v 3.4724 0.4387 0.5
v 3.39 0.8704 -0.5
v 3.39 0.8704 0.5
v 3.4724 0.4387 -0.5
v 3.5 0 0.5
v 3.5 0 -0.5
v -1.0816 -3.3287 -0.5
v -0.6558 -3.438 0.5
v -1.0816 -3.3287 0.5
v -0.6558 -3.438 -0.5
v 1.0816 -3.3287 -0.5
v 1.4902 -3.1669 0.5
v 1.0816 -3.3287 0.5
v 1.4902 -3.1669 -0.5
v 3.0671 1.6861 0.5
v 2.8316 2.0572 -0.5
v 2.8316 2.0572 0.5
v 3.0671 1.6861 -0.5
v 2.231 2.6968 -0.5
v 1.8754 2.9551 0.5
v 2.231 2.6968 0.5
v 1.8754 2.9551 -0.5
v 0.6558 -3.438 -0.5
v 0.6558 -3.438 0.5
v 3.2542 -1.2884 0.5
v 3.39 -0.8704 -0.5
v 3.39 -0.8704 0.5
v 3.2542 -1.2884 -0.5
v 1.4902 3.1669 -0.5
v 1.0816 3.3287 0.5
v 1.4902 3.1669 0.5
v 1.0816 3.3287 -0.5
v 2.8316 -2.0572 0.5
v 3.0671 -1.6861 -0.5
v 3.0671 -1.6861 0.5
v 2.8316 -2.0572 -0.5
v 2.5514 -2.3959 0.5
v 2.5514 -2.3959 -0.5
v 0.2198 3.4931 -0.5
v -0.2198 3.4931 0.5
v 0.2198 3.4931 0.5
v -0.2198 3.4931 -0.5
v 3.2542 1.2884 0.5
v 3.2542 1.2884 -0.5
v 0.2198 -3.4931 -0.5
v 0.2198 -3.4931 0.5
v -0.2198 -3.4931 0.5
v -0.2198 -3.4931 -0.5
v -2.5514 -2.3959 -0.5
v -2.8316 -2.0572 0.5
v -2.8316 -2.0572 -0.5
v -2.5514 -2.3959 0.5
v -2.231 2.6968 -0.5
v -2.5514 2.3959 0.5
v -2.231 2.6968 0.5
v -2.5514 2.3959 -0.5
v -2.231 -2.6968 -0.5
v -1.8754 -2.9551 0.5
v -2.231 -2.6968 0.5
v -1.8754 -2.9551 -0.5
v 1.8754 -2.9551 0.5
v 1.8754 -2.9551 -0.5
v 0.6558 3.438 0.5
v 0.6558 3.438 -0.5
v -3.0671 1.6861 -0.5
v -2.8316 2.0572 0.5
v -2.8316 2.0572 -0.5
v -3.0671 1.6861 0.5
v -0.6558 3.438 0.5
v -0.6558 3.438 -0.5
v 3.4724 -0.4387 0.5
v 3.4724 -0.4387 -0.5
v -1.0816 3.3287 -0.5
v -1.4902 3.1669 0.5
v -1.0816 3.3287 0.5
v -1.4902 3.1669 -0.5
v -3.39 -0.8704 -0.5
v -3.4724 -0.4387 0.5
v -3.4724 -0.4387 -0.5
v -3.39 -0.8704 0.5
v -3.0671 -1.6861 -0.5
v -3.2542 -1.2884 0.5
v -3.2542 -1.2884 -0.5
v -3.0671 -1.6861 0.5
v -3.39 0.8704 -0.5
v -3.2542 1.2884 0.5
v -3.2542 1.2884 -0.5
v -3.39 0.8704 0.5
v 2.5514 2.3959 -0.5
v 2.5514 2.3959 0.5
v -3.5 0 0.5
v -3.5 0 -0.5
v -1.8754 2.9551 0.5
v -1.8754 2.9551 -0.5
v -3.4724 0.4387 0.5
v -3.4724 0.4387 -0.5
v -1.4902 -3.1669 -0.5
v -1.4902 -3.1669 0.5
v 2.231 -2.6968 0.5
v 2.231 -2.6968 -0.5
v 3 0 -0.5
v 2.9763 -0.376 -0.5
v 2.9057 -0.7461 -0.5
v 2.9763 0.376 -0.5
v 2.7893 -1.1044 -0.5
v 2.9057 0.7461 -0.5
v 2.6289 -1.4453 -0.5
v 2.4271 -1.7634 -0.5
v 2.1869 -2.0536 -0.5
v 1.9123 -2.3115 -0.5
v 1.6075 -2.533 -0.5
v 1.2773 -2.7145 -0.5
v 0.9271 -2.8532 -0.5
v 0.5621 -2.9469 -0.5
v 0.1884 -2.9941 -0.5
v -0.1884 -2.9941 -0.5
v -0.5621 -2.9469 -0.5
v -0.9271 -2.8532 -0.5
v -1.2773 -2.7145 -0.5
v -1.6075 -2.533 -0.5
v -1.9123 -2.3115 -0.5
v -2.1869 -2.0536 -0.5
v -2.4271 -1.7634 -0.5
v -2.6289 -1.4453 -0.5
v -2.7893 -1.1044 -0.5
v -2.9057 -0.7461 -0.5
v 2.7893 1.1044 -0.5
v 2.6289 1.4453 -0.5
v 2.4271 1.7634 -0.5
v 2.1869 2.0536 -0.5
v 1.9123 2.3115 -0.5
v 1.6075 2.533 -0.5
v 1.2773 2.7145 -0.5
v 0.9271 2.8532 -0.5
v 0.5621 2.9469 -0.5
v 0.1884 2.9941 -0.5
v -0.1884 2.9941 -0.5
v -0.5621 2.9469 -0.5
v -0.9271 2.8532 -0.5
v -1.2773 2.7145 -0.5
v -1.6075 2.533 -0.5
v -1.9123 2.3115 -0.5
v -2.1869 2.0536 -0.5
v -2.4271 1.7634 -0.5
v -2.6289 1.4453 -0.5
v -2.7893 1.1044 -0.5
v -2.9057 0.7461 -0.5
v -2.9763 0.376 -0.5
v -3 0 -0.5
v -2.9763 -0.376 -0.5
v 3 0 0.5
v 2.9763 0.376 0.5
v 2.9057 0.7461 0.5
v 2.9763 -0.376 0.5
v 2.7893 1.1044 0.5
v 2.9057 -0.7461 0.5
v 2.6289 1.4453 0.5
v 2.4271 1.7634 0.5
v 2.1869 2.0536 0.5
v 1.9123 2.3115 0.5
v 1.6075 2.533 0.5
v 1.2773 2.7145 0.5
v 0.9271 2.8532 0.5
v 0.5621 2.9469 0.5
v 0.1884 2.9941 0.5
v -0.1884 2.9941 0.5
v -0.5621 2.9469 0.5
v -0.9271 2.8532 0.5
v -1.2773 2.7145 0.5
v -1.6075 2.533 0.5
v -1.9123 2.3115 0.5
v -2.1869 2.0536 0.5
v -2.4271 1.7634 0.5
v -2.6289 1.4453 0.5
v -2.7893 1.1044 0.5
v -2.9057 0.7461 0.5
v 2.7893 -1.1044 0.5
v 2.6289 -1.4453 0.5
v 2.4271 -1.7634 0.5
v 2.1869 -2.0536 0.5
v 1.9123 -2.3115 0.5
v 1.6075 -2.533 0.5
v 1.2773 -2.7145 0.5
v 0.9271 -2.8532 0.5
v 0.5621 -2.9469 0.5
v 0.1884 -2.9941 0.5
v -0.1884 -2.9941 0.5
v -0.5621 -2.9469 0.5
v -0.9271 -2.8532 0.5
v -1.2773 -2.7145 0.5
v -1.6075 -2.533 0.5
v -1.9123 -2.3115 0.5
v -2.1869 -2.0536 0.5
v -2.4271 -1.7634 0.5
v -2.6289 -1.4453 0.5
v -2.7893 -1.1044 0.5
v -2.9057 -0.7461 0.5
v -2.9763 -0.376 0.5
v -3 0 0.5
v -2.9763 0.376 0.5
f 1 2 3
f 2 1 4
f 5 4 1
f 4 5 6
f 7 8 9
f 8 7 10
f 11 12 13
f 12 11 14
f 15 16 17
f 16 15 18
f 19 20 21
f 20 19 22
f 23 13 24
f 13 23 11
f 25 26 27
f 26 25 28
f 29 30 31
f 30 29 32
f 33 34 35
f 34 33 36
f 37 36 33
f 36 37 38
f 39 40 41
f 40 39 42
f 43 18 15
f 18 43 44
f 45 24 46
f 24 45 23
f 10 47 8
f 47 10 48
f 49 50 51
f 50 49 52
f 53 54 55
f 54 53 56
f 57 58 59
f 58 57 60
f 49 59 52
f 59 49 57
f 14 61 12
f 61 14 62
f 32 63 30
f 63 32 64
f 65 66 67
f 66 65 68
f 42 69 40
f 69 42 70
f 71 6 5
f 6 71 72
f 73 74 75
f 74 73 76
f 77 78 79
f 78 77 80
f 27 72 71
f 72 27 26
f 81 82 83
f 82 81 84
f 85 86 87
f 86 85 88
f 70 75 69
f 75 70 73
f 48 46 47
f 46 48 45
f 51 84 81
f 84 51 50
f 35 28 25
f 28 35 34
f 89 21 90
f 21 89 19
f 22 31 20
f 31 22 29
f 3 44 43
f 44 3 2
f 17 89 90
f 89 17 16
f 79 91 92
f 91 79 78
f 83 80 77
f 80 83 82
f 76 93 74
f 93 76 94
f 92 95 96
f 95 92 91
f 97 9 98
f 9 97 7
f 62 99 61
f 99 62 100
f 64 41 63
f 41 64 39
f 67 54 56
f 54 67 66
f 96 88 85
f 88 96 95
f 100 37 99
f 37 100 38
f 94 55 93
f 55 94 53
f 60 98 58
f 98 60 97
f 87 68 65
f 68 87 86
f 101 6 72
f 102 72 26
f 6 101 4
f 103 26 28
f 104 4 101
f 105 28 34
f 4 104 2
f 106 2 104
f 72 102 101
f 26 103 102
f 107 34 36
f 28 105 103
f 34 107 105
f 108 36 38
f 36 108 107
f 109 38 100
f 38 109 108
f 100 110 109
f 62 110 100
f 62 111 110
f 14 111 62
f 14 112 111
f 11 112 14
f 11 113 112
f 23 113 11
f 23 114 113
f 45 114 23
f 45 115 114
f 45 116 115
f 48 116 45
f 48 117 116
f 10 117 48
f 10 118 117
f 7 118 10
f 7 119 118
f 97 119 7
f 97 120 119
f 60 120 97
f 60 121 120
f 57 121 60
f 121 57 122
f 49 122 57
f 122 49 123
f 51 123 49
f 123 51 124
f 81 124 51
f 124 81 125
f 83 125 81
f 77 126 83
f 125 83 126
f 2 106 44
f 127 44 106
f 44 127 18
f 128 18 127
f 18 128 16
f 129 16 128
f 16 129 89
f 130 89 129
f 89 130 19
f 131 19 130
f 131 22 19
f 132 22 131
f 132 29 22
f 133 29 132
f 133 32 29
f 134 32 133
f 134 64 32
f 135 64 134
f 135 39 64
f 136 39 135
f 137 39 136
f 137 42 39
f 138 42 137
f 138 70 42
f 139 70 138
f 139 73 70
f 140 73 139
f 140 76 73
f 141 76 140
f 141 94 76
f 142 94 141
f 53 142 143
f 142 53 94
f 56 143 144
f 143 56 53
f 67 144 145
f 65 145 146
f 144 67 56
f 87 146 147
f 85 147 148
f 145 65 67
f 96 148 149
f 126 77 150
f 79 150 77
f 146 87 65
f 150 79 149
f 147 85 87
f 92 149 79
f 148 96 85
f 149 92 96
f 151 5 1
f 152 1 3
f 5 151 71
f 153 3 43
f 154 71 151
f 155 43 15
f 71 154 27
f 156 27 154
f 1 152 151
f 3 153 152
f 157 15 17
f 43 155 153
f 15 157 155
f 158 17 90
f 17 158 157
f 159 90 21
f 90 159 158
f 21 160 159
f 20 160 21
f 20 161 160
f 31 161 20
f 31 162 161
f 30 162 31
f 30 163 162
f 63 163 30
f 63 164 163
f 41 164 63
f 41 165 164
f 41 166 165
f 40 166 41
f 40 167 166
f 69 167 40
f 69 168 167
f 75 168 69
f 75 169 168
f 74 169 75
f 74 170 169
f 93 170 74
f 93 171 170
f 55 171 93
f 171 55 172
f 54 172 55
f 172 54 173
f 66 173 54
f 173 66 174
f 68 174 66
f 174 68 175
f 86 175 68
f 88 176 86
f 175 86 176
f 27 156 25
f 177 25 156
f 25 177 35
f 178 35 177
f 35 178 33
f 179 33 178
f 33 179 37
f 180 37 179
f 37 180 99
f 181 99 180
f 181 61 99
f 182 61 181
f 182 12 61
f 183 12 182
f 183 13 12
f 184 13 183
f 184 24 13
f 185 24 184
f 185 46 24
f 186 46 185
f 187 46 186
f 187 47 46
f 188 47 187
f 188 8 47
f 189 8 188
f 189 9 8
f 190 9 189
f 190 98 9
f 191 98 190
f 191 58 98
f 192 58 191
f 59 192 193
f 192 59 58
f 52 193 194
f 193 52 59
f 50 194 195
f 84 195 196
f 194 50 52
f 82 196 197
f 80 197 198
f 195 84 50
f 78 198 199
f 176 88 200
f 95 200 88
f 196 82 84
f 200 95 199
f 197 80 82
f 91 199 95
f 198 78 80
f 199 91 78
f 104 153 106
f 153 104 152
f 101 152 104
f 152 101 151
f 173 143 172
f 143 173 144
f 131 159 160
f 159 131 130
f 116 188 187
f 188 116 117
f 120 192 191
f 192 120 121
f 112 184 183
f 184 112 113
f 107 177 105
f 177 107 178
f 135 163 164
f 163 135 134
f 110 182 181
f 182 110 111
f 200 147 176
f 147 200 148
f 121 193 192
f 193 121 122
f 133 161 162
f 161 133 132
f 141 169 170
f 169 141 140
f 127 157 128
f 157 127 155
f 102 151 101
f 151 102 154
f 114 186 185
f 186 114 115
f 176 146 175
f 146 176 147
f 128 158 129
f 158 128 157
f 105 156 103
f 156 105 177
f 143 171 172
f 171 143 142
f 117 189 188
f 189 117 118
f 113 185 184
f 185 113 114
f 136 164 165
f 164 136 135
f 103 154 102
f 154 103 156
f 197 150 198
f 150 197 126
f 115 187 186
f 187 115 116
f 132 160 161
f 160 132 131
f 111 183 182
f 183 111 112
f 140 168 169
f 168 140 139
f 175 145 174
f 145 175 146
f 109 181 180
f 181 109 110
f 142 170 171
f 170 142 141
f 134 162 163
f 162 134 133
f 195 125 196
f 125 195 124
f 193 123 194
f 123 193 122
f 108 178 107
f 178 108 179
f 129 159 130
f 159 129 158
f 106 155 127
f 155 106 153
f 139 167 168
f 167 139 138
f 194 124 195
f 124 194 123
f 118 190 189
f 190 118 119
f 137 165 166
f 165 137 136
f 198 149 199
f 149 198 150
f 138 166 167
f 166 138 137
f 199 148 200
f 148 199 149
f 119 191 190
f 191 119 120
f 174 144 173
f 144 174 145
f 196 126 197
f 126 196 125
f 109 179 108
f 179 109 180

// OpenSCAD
$fn = 50;


difference() {
	union() {
		translate(v = [0, 0, -0.5000000000]) {
			cylinder(h = 1, r = 3.5000000000);
		}
	}
	union() {
		translate(v = [0, 0, -100.0000000000]) {
			cylinder(h = 200, r = 3.0000000000);
		}
	}
}
